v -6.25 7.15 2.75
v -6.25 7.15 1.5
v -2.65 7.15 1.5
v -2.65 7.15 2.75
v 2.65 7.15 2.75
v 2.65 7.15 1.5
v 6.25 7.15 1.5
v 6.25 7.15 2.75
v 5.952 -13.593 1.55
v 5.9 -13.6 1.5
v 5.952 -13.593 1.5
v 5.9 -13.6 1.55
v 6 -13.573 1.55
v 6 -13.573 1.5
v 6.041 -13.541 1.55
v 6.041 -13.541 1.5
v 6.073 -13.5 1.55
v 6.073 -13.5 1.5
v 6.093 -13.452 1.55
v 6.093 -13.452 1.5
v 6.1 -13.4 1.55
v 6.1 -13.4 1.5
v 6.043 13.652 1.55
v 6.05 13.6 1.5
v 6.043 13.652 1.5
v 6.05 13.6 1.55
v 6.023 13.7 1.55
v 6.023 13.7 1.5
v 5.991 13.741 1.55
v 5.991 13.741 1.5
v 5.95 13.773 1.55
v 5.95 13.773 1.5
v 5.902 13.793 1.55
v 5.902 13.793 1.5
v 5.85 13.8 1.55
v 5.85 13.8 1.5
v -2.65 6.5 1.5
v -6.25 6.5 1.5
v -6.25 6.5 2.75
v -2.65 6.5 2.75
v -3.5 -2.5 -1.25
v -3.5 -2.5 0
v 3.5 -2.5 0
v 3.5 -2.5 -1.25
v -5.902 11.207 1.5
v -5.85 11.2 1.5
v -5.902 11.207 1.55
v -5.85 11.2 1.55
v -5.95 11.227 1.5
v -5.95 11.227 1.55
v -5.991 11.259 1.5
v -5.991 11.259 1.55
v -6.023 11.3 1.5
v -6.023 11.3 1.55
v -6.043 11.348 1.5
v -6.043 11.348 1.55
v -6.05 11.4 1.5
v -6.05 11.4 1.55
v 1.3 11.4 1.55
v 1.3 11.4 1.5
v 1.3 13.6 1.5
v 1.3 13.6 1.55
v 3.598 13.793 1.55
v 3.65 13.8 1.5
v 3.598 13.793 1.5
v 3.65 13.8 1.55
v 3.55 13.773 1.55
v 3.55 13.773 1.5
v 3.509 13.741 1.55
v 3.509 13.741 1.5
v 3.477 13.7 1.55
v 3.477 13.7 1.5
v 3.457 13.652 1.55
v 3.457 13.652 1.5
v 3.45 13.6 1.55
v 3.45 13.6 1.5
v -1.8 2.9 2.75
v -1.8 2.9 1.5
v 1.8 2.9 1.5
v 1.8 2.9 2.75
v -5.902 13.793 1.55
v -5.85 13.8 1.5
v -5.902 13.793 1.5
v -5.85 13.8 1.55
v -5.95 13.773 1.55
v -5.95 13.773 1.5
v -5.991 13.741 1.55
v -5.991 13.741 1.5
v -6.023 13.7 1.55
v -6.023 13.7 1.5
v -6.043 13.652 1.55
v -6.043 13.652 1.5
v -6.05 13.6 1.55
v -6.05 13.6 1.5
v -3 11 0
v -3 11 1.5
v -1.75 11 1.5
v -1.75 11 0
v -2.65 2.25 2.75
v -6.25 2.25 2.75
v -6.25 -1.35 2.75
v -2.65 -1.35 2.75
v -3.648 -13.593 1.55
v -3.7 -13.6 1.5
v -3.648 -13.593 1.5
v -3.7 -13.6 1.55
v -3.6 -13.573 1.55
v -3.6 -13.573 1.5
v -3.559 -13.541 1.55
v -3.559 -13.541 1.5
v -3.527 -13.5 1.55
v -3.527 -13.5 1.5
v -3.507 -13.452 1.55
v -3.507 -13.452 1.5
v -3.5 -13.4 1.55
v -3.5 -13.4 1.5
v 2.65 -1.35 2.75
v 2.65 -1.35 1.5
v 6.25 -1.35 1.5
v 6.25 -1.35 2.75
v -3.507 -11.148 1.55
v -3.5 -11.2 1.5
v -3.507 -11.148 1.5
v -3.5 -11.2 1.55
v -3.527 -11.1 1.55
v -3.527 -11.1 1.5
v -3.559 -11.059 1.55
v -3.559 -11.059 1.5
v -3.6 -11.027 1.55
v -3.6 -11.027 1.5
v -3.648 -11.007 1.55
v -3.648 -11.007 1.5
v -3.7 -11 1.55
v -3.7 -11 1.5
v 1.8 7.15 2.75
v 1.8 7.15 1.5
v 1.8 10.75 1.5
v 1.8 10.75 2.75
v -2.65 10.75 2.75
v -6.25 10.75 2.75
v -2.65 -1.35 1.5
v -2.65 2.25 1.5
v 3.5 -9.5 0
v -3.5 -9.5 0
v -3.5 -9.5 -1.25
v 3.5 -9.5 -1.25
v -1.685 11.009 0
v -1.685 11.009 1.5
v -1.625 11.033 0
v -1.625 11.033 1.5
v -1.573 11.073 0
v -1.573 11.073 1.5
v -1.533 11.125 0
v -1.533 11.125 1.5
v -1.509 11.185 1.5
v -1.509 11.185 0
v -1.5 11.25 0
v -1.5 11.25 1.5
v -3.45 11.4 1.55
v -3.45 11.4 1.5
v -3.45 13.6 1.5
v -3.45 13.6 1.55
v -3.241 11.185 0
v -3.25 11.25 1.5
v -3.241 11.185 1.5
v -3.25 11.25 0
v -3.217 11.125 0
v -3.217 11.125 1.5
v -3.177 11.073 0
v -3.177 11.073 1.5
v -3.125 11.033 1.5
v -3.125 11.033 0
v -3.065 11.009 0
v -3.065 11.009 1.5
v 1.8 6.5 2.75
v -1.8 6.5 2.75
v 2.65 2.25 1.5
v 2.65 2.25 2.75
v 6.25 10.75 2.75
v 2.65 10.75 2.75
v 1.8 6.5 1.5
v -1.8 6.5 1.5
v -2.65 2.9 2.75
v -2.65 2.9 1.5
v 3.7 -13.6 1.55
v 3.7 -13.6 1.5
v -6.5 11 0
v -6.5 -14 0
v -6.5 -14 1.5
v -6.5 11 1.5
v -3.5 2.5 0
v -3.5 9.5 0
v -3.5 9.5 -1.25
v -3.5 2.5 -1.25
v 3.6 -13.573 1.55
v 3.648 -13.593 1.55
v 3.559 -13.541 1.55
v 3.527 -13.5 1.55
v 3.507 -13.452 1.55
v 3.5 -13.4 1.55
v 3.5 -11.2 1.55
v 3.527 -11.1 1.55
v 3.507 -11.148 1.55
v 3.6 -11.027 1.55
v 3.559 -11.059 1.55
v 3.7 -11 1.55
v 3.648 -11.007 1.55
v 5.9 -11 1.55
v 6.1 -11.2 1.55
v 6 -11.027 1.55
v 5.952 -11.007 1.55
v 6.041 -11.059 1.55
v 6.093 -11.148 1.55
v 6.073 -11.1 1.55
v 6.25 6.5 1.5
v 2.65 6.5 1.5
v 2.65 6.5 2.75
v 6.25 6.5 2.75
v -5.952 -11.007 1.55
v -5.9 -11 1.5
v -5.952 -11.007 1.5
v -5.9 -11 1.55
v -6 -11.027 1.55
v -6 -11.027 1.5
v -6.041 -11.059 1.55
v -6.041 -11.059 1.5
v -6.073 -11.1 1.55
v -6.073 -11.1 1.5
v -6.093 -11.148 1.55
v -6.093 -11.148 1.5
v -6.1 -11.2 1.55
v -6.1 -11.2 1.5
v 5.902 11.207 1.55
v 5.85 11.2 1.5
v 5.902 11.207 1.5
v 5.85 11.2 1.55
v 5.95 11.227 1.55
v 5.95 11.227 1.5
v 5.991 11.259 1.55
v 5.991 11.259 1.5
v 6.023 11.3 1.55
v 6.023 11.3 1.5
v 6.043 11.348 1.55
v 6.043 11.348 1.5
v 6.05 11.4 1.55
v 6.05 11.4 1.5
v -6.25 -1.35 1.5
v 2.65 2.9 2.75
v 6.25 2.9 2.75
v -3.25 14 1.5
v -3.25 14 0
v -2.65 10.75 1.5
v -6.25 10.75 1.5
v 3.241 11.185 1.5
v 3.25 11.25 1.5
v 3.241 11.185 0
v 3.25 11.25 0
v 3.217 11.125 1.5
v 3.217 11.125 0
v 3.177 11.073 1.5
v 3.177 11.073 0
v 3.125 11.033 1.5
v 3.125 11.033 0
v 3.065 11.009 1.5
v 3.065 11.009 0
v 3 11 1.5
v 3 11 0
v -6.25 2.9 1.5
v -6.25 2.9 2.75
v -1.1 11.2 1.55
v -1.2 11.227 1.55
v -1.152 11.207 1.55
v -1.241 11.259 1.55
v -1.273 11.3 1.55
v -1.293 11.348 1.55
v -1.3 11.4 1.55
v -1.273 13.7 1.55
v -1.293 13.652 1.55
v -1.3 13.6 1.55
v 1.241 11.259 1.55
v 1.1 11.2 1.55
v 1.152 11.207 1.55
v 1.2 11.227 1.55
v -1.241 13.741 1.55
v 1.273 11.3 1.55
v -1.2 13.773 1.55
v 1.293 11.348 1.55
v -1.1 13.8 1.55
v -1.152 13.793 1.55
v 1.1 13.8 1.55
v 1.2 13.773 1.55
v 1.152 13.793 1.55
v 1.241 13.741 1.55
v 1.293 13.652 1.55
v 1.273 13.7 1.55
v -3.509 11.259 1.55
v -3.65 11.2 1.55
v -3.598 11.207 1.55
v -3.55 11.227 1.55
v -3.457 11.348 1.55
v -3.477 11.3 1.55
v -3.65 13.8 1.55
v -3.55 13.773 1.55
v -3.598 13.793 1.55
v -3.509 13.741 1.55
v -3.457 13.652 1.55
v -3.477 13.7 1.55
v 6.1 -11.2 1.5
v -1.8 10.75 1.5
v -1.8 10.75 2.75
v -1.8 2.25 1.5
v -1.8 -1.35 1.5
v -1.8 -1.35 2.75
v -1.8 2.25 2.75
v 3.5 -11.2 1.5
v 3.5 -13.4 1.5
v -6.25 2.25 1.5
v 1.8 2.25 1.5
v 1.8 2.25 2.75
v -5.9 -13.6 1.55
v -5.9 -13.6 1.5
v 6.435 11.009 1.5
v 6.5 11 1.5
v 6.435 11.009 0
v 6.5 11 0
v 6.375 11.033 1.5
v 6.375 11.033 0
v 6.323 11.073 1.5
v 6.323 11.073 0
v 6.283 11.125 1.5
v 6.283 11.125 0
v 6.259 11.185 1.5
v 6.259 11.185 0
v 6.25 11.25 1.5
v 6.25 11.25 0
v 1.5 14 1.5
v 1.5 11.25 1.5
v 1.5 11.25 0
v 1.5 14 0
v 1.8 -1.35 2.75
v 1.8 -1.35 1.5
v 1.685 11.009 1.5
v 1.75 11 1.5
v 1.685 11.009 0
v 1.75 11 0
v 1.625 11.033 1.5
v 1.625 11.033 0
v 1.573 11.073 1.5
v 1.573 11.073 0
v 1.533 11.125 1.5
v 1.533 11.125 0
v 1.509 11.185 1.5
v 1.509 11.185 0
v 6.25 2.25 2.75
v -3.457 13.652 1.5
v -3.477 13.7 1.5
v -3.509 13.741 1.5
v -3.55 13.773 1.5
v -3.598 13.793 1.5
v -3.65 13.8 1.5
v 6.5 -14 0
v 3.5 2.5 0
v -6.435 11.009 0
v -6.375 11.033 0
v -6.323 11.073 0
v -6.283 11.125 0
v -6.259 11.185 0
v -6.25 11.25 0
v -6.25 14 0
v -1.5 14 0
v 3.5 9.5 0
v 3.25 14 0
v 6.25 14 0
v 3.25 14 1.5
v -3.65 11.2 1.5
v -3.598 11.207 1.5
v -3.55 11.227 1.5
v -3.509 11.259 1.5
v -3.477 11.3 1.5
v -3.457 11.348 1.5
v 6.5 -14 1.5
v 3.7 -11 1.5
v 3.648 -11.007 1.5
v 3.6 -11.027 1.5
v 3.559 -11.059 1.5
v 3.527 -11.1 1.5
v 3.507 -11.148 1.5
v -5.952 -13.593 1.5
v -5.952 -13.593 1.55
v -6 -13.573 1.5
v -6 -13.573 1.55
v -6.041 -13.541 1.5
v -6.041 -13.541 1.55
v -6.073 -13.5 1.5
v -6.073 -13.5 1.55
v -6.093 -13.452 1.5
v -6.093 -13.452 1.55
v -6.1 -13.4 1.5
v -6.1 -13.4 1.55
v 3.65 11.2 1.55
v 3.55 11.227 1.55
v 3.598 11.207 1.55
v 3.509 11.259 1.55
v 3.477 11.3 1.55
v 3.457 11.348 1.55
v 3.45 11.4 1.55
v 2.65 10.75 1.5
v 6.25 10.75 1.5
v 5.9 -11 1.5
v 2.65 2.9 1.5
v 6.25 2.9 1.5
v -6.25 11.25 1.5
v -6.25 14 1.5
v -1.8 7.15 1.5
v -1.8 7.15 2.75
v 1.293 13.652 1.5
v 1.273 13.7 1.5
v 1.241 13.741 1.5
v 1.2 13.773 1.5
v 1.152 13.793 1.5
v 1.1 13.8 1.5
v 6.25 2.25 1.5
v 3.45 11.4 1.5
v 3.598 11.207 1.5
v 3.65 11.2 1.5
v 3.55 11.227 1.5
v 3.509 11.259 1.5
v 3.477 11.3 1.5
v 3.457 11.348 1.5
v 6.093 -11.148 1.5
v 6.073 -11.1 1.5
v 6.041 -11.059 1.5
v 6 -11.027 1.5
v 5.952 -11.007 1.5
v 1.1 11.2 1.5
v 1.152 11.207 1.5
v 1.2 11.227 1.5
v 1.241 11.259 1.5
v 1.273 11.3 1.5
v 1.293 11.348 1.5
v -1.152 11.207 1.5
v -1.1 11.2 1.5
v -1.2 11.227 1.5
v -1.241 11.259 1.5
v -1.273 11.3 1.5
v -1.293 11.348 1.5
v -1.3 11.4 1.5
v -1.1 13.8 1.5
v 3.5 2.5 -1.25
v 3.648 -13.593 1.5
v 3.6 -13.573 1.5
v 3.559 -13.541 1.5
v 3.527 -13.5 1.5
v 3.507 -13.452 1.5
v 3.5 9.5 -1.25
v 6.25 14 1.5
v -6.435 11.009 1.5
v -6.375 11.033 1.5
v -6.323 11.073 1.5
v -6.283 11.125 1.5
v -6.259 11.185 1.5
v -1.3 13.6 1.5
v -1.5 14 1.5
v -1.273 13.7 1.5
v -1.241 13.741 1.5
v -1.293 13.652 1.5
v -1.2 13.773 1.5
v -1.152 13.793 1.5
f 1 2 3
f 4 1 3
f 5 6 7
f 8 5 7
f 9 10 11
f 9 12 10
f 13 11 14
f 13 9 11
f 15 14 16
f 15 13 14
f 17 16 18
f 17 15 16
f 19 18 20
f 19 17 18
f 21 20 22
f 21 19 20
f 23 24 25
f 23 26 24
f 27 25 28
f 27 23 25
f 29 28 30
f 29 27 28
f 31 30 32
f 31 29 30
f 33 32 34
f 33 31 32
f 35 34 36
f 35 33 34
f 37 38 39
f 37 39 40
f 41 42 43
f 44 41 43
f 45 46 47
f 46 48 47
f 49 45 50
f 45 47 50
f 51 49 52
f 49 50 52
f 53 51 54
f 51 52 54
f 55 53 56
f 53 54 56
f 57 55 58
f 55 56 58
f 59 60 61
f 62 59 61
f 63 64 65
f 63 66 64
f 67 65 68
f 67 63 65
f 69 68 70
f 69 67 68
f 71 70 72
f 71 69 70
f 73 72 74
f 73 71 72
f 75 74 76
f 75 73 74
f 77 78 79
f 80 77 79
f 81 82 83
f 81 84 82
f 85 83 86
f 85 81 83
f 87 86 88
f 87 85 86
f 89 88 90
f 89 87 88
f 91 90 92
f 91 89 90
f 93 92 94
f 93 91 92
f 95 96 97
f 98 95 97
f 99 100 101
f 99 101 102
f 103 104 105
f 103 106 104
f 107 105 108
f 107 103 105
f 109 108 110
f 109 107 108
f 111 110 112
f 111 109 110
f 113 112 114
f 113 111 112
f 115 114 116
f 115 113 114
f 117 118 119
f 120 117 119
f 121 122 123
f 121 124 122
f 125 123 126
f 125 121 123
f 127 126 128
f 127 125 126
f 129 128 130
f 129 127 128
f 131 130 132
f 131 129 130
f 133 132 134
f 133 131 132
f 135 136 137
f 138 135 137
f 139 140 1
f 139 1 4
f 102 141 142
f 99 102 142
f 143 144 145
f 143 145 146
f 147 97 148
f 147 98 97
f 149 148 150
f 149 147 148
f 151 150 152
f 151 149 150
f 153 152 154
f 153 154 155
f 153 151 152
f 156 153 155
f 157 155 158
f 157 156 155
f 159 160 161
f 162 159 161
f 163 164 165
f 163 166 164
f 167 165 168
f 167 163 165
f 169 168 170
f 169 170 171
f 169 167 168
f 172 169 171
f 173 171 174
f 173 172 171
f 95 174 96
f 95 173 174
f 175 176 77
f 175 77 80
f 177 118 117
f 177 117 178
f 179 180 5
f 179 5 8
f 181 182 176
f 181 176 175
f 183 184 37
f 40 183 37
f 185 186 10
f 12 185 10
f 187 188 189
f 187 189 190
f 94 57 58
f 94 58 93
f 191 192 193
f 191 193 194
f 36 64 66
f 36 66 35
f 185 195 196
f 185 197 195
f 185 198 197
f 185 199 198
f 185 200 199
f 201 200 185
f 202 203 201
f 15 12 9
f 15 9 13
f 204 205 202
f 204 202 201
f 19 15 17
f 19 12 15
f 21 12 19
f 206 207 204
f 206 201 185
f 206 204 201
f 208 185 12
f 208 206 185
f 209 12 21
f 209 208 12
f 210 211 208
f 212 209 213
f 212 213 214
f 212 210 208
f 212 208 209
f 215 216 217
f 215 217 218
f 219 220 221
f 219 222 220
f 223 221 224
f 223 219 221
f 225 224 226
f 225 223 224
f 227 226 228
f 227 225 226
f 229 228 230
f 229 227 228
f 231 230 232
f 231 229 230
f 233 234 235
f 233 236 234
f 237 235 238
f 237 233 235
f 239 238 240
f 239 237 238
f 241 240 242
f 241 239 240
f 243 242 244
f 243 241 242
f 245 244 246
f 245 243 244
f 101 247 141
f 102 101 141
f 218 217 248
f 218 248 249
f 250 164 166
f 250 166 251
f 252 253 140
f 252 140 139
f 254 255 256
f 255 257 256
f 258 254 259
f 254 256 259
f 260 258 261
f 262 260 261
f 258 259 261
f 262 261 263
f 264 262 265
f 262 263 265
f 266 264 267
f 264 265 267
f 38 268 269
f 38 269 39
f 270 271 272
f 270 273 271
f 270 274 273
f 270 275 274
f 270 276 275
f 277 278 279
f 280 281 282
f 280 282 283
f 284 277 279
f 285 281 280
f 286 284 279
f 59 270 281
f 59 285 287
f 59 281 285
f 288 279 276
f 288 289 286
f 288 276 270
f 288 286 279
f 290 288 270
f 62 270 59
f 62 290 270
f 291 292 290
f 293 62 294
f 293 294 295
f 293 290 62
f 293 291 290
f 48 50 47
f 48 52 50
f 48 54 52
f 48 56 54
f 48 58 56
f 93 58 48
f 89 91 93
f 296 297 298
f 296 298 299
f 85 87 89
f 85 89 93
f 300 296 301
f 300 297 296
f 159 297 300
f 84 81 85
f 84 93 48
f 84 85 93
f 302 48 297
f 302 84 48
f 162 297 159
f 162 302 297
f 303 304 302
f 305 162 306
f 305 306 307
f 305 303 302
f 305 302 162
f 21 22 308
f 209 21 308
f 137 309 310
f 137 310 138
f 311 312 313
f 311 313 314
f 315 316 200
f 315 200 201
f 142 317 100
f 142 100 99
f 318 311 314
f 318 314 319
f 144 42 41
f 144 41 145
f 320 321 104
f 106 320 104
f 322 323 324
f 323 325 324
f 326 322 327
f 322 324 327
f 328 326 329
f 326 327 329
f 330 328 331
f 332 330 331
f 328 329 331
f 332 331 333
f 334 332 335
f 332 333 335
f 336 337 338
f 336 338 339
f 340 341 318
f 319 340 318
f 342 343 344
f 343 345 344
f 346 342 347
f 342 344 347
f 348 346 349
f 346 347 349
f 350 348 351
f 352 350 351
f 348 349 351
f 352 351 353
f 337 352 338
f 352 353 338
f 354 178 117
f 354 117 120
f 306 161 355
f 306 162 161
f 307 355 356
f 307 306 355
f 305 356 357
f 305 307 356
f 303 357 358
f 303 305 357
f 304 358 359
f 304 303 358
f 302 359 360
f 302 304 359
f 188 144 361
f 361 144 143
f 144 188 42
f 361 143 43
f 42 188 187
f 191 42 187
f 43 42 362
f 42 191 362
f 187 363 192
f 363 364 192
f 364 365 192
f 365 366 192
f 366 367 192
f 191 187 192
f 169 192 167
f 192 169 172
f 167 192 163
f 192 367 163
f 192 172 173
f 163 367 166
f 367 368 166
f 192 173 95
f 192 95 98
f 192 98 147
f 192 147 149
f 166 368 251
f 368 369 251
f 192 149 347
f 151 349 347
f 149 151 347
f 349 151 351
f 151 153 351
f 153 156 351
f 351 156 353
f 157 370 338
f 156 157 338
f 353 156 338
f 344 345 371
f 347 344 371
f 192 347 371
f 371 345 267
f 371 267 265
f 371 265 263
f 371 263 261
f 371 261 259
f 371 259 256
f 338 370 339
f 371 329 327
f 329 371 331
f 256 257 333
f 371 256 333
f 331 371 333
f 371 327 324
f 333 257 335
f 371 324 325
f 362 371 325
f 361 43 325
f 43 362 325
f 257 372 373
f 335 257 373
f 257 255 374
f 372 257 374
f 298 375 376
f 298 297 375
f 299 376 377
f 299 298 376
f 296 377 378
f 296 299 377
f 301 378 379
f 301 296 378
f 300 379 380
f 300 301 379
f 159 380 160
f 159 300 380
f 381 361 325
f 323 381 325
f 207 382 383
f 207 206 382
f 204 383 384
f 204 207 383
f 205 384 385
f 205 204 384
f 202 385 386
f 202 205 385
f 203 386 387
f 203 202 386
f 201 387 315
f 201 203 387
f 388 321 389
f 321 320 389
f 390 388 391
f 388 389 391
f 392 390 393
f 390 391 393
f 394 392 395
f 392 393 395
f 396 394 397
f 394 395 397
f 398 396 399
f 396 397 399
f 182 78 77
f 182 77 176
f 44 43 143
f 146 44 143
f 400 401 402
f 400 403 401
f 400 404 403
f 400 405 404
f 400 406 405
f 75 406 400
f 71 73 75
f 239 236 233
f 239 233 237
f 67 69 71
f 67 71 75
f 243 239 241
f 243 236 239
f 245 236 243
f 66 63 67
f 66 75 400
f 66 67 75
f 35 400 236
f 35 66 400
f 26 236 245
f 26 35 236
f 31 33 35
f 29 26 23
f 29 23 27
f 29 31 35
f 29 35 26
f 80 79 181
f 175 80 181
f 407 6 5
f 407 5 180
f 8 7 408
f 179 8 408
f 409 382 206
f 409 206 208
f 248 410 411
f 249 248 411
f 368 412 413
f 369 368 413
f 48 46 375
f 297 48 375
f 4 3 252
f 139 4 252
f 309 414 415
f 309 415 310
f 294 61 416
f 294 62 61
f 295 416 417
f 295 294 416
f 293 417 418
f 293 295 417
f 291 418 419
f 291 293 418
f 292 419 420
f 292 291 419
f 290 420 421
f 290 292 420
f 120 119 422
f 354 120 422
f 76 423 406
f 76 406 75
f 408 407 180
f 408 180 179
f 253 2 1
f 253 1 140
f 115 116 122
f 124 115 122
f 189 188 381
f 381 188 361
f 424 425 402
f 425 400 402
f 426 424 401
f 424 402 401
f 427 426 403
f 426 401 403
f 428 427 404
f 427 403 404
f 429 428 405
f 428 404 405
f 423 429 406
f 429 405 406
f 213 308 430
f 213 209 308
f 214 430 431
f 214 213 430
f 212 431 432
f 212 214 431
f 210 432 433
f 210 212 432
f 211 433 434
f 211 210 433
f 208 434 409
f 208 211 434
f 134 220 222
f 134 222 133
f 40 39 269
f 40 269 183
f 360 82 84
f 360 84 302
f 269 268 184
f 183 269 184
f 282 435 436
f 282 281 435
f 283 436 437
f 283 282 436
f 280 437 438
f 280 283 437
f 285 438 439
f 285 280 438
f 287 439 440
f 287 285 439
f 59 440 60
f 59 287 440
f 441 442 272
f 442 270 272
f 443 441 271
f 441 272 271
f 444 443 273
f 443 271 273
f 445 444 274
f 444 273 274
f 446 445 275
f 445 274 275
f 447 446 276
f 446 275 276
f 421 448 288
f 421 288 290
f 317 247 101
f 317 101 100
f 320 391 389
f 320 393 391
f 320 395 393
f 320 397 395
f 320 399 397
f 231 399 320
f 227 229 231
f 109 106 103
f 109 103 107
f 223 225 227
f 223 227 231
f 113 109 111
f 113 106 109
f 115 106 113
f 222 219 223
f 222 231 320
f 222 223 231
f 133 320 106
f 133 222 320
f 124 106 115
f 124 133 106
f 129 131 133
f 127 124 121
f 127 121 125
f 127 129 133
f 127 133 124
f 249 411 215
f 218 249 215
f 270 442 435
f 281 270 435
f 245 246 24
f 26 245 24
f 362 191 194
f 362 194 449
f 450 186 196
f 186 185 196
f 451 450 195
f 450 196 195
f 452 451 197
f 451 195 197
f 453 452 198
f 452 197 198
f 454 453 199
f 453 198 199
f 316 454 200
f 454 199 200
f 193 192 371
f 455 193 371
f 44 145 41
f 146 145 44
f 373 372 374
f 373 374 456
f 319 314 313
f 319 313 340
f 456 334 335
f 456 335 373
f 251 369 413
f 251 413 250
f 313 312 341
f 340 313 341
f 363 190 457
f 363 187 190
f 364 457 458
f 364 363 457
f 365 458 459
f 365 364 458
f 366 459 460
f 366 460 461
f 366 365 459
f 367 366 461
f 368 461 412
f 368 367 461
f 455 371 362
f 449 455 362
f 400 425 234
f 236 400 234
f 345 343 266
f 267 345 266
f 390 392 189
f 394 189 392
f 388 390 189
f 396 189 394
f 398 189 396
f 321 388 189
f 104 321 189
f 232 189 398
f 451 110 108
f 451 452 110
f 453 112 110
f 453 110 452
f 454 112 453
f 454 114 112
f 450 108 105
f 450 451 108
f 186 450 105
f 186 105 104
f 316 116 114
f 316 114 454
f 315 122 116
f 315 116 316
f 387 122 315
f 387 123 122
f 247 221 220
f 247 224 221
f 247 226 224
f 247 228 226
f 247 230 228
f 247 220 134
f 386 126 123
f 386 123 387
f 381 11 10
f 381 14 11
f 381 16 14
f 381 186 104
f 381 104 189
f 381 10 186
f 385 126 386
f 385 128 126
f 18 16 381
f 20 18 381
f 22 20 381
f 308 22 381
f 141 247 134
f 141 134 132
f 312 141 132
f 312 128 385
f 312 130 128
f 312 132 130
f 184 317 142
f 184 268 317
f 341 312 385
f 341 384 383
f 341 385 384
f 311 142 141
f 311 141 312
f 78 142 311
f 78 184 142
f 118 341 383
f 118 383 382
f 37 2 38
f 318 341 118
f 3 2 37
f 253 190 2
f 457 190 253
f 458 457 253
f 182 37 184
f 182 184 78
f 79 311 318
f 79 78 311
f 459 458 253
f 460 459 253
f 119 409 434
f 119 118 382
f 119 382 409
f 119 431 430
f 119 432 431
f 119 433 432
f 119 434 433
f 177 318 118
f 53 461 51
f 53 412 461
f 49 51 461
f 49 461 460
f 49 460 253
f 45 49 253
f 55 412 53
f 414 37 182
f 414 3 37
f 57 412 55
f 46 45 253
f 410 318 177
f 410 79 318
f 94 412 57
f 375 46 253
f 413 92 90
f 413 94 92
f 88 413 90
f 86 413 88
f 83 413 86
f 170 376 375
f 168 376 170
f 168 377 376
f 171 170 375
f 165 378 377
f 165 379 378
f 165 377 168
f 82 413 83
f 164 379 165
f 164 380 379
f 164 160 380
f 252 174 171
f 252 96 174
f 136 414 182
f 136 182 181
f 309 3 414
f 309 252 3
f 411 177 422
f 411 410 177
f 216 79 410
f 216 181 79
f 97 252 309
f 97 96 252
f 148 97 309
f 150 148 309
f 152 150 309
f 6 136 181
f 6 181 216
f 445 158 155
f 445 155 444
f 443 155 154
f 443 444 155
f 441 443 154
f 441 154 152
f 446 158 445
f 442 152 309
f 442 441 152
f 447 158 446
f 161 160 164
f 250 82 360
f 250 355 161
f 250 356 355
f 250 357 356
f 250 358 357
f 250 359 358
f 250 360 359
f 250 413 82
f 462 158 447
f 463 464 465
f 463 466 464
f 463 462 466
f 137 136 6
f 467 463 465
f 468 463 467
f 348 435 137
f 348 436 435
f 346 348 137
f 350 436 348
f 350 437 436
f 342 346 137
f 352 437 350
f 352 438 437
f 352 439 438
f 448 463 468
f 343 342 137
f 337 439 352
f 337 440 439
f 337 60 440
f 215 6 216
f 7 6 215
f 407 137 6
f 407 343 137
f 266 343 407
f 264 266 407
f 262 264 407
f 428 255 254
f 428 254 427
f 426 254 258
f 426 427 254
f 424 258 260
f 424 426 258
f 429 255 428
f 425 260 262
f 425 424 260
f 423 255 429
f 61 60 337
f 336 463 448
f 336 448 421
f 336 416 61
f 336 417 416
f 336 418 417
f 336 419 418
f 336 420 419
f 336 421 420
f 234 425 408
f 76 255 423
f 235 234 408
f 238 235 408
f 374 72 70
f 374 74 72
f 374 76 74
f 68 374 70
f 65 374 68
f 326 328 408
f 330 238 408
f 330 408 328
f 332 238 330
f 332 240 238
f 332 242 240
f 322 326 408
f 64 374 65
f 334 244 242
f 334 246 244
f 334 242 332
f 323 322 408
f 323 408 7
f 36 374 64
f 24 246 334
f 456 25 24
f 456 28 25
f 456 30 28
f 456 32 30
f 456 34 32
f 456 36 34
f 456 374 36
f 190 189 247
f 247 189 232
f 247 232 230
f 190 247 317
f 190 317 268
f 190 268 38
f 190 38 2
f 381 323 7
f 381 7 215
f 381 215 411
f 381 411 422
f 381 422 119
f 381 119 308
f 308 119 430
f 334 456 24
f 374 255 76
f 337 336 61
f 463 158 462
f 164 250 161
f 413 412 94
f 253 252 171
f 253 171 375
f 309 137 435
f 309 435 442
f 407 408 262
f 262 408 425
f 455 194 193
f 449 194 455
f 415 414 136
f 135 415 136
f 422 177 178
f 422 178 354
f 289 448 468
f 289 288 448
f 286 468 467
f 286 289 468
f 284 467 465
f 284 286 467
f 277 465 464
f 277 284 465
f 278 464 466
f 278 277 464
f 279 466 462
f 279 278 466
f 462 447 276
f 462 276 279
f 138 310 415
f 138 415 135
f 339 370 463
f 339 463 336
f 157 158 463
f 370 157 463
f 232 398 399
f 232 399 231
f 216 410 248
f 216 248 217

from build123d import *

# Parameters (mm, degrees)
F0_W      = 13
F0_H      = 28
F1_DEPTH  = 1.5
F2_W      = 1.75
F2_H      = 3
F2_W_2    = 0.25
F3_DEPTH  = 25
F4_W      = 2.6
F4_H      = 2.6
F5_DEPTH  = 0.05
F6_R      = 0.2
F7_R      = 0.24999
F8_W      = 2.6
F8_H      = 2.6
F9_DEPTH  = 0.05
F10_R     = 0.2
F11_W     = 3.6
F11_H     = 3.6
F12_DEPTH = 1.25
F13_W     = 7
F13_H     = 7
F14_DEPTH = 1.25


# Not quite as in the source:
# - a fillet or chamfer is up to 0.001 mm smaller than in the source, because OpenCascade refuses the exact size


with BuildPart() as f1:
    # F0 (on Top) → F1 (new body)
    with BuildSketch(Plane.XY):
        Rectangle(F0_W, F0_H)
    extrude(amount=F1_DEPTH)

    # F2 (on face) → F3 (cut)
    with BuildSketch(Plane.XY.offset(1.5)):
        with Locations((-2.375, 12.5)):
            Rectangle(F2_W, F2_H)
        with Locations((2.375, 12.5)):
            Rectangle(F2_W, F2_H)
        with Locations((-6.375, 12.5)):
            Rectangle(F2_W_2, F2_H)
        with Locations((6.375, 12.5)):
            Rectangle(F2_W_2, F2_H)
    extrude(amount=-F3_DEPTH, mode=Mode.SUBTRACT)

    # F4 (on face) → F5 (join)
    with BuildSketch(Plane.XY.offset(1.5)):
        with Locations((-4.75, 12.5)):
            Rectangle(F4_W, F4_H)
        with Locations((0, 12.5)):
            Rectangle(F4_W, F4_H)
        with Locations((4.75, 12.5)):
            Rectangle(F4_W, F4_H)
    extrude(amount=F5_DEPTH)

    # F6
    f6_edges = [f1.edges().sort_by_distance(p)[0] for p in [
        (-6.05, 11.2, 1.525),
        (-6.05, 13.8, 1.525),
        (-3.45, 11.2, 1.525),
        (-3.45, 13.8, 1.525),
        (1.3, 13.8, 1.525),
        (-1.3, 13.8, 1.525),
        (1.3, 11.2, 1.525),
        (3.45, 13.8, 1.525),
        (6.05, 13.8, 1.525),
        (6.05, 11.2, 1.525),
        (-1.3, 11.2, 1.525),
        (3.45, 11.2, 1.525),
    ]]
    fillet(f6_edges, radius=F6_R)

    # F7 (radius 0.25 in the source; OpenCascade refuses exactly that, so slightly less here)
    f7_edges = [f1.edges().sort_by_distance(p)[0] for p in [
        (6.25, 11, 0.75),
        (-6.25, 11, 0.75),
        (-1.5, 11, 0.75),
        (3.25, 11, 0.75),
        (-3.25, 11, 0.75),
        (1.5, 11, 0.75),
    ]]
    fillet(f7_edges, radius=F7_R)

    # F8 (on face) → F9 (join)
    with BuildSketch(Plane.XY.offset(1.5)):
        with Locations((-4.8, -12.3)):
            Rectangle(F8_W, F8_H)
        with Locations((4.8, -12.3)):
            Rectangle(F8_W, F8_H)
    extrude(amount=F9_DEPTH)

    # F10
    f10_edges = [f1.edges().sort_by_distance(p)[0] for p in [
        (-6.1, -13.6, 1.525),
        (-3.5, -13.6, 1.525),
        (-6.1, -11, 1.525),
        (3.5, -13.6, 1.525),
        (6.1, -13.6, 1.525),
        (3.5, -11, 1.525),
        (-3.5, -11, 1.525),
        (6.1, -11, 1.525),
    ]]
    fillet(f10_edges, radius=F10_R)

    # F11 (on face) → F12 (join)
    with BuildSketch(Plane.XY.offset(1.5)):
        with Locations((-4.45, 8.95)):
            Rectangle(F11_W, F11_H)
        with Locations((0, 8.95)):
            Rectangle(F11_W, F11_H)
        with Locations((4.45, 8.95)):
            Rectangle(F11_W, F11_H)
        with Locations((4.45, 4.7)):
            Rectangle(F11_W, F11_H)
        with Locations((0, 4.7)):
            Rectangle(F11_W, F11_H)
        with Locations((-4.45, 4.7)):
            Rectangle(F11_W, F11_H)
        with Locations((4.45, 0.45)):
            Rectangle(F11_W, F11_H)
        with Locations((0, 0.45)):
            Rectangle(F11_W, F11_H)
        with Locations((-4.45, 0.45)):
            Rectangle(F11_W, F11_H)
    extrude(amount=F12_DEPTH)

    # F13 (on face) → F14 (join)
    with BuildSketch(Plane(origin=(0, 0, 0), x_dir=(1, 0, 0), z_dir=(0, 0, -1))):
        with Locations((0, -6)):
            Rectangle(F13_W, F13_H)
        with Locations((0, 6)):
            Rectangle(F13_W, F13_H)
    extrude(amount=F14_DEPTH)


solid = f1.part
